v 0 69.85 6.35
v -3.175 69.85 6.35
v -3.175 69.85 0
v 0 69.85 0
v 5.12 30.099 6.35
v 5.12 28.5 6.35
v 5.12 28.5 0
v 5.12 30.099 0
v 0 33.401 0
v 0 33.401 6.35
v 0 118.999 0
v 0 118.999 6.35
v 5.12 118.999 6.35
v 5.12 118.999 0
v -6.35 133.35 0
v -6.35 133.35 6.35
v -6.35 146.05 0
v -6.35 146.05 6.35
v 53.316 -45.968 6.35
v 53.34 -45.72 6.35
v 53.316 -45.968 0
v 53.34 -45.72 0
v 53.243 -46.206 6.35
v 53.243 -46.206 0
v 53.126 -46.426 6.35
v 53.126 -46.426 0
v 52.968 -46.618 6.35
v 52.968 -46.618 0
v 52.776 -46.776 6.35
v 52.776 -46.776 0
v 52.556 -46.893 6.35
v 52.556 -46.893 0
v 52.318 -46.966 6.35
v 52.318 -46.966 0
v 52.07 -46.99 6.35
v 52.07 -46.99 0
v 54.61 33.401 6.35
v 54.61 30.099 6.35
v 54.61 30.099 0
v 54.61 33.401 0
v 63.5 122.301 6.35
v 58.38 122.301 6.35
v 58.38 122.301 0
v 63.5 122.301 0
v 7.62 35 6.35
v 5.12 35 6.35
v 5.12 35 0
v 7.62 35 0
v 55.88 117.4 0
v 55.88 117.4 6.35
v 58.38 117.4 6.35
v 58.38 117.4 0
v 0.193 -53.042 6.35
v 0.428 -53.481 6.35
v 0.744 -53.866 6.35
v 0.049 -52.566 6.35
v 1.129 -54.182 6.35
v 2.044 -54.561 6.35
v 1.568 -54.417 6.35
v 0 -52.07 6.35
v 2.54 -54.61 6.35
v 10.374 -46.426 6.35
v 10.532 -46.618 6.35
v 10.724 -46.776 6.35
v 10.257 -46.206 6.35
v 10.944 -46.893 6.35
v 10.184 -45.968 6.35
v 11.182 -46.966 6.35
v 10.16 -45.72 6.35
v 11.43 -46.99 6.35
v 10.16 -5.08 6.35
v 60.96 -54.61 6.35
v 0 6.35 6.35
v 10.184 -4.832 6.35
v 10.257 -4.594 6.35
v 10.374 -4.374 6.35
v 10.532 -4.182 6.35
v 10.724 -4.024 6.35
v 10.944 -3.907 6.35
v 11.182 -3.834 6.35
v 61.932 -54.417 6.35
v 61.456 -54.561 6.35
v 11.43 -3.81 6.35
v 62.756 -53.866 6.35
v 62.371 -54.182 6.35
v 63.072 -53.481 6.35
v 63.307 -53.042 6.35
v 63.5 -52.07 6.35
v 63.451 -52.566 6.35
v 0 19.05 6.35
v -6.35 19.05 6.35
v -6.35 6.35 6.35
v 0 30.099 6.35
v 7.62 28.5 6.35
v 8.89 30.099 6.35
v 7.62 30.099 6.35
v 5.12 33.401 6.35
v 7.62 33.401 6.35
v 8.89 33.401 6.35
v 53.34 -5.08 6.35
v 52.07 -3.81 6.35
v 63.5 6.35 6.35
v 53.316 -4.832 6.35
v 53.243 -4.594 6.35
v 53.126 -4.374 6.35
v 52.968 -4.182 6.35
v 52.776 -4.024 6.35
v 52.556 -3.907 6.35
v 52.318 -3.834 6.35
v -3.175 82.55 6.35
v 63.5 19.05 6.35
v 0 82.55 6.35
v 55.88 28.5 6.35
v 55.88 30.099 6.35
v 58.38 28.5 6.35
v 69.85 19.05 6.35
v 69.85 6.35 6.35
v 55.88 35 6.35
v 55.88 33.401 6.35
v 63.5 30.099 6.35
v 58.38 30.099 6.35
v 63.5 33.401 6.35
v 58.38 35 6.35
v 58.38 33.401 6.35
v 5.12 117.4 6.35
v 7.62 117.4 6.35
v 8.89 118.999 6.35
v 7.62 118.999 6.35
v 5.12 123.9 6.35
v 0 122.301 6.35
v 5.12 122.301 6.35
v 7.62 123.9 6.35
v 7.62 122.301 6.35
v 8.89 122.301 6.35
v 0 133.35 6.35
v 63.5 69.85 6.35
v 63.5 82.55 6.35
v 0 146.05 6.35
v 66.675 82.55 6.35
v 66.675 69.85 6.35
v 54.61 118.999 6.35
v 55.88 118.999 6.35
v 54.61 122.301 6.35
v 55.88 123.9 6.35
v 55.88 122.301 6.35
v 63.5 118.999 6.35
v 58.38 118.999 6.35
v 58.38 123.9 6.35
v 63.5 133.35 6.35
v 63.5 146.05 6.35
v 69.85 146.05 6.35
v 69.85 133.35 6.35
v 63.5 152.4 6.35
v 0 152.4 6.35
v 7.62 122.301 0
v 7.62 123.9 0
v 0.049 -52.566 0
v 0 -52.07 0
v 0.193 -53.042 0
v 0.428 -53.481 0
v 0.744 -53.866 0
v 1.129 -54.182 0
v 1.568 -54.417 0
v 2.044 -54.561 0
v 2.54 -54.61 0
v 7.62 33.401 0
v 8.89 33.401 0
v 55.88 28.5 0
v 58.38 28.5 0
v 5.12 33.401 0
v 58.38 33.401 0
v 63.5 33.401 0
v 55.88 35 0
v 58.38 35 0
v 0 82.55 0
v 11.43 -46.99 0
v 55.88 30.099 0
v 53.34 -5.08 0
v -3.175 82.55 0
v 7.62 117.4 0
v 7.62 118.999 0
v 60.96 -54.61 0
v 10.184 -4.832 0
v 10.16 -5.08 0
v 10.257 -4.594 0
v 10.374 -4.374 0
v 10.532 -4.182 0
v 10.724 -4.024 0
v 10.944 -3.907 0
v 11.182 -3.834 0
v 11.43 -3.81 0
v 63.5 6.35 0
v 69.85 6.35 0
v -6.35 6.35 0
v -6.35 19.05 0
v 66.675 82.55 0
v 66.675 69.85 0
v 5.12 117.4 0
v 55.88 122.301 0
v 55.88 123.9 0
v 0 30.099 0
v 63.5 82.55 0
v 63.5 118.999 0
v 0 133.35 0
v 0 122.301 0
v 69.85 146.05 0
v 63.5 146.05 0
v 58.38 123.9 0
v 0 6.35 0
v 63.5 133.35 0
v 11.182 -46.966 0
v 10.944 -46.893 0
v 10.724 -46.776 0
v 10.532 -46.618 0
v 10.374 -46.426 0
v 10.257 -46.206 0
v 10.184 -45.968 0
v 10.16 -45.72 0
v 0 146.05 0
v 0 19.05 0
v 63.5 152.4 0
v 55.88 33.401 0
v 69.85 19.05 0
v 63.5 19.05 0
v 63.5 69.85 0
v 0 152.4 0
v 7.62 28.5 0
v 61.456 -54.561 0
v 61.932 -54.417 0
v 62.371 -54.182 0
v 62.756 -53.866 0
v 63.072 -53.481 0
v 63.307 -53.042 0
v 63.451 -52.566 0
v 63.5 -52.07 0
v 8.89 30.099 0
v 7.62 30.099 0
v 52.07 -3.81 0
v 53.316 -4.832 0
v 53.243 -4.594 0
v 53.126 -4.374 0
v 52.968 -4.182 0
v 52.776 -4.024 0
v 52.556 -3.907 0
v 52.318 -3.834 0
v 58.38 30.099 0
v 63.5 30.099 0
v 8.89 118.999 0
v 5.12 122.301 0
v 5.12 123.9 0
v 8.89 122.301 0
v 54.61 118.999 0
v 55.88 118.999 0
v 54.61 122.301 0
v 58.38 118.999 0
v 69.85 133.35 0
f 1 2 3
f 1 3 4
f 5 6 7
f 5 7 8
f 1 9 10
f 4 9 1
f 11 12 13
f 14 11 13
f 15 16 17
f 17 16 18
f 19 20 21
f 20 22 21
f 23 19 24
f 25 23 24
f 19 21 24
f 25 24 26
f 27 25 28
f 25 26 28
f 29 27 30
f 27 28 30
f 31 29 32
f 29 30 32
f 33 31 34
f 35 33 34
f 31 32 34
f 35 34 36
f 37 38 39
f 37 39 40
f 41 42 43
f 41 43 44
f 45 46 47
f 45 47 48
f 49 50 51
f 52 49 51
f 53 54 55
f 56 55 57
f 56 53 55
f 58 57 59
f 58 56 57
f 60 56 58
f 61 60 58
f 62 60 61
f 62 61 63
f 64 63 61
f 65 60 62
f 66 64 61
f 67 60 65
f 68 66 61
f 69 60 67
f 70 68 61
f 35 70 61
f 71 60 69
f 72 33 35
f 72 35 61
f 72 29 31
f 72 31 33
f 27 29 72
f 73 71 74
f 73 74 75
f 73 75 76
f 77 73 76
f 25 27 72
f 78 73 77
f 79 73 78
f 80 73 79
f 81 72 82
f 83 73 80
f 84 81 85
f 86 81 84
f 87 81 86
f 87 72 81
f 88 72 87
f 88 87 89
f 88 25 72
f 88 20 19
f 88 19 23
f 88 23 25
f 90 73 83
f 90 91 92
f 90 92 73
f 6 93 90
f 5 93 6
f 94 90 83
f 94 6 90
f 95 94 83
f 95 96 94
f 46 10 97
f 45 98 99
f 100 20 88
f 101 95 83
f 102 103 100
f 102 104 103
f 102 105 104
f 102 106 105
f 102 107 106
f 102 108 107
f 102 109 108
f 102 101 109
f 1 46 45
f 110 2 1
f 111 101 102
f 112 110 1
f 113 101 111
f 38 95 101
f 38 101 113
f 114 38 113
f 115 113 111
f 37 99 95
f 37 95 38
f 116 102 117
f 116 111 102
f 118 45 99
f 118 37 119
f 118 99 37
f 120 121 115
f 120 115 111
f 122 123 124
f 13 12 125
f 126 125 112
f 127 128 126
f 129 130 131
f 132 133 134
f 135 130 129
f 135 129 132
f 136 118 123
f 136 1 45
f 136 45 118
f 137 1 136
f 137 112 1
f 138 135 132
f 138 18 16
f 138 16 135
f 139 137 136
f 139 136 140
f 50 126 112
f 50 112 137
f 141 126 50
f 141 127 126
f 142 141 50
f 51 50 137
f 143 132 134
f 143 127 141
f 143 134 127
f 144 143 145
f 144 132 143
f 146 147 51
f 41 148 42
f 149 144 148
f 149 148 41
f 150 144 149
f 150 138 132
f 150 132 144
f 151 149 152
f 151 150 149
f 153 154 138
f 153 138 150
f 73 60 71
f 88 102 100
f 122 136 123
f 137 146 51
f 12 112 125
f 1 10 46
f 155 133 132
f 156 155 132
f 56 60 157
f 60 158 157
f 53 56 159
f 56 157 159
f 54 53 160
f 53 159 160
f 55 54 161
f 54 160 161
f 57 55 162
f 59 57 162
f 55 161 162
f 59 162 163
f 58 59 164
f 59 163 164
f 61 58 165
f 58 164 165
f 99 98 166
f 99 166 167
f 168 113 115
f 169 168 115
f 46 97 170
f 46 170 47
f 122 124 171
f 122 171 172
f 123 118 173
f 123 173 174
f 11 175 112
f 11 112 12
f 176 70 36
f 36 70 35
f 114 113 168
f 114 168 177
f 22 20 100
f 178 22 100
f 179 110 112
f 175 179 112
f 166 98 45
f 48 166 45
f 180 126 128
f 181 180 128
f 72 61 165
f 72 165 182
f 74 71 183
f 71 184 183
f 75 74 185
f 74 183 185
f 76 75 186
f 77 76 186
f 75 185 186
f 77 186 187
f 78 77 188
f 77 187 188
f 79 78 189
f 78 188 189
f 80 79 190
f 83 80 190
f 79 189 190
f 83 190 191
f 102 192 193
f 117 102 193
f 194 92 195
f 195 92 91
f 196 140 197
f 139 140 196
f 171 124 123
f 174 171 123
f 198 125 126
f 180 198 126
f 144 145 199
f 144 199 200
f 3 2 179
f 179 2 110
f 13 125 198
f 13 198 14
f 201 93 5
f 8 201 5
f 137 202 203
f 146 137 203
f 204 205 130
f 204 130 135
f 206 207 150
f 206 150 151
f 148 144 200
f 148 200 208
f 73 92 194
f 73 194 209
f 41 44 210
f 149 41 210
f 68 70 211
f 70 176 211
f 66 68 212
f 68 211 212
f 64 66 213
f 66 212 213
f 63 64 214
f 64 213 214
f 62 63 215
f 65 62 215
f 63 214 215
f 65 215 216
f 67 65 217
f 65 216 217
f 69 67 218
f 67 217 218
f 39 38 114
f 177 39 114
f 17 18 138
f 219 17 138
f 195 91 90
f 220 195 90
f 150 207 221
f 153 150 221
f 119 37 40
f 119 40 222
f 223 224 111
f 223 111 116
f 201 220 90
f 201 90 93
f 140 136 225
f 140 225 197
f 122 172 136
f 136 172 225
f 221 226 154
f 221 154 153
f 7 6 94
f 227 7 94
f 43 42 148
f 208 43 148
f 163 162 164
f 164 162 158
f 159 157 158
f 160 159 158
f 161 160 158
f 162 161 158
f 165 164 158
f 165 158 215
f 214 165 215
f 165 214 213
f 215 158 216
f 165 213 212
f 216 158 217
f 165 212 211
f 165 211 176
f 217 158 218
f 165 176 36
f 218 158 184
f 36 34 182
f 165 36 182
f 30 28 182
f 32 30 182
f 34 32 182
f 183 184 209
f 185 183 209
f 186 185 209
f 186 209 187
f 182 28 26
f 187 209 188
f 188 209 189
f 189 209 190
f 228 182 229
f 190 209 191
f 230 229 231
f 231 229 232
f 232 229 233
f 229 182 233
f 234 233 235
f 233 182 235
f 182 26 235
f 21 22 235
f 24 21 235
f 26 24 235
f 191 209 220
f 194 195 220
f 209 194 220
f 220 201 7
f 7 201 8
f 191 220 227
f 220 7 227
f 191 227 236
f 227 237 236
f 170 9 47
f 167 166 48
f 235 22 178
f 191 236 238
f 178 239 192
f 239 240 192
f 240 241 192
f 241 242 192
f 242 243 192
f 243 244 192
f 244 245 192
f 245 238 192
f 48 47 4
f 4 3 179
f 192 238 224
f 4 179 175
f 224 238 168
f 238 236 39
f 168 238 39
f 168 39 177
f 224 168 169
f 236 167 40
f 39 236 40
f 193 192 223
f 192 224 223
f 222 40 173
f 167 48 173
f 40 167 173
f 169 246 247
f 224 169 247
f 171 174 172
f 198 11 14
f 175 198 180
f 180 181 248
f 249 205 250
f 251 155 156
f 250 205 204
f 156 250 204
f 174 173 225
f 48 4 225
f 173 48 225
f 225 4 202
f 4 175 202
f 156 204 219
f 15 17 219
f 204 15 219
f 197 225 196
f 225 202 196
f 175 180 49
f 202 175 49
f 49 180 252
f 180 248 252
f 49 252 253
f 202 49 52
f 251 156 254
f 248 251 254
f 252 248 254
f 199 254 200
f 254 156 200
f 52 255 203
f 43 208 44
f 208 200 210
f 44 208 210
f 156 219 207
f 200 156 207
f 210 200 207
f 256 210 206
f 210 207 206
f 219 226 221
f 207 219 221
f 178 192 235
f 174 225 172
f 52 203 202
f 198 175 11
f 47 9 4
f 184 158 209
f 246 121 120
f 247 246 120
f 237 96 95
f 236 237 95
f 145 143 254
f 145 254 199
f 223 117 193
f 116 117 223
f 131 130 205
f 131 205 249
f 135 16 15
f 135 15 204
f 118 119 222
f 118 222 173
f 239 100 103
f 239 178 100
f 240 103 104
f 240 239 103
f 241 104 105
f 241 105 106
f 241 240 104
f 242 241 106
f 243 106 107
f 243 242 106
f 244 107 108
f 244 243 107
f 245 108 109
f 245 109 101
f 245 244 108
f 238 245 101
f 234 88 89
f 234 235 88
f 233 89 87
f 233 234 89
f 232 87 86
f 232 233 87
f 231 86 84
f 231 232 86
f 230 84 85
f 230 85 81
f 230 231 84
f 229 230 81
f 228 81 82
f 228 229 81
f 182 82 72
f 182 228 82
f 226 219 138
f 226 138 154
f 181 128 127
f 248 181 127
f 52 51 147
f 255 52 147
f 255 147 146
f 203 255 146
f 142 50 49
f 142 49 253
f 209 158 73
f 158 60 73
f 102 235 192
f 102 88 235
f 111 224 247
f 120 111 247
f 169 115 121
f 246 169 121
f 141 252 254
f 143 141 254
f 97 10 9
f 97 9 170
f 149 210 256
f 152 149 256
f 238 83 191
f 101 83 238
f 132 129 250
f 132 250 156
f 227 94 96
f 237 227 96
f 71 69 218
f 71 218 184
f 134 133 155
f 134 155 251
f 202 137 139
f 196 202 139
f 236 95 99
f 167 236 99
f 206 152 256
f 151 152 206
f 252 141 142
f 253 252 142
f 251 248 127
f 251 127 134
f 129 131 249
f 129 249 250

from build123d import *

# Parameters (mm, degrees)
SKETCH1_W           = 63.5
SKETCH1_H           = 152.4
BOSS_EXTRUDE1_DEPTH = 6.35
SKETCH2_W           = 3.175
SKETCH2_H           = 12.7
SKETCH2_W_2         = 6.35
BOSS_EXTRUDE3_DEPTH = 6.35
SKETCH4_W           = 8.89
SKETCH4_H           = 3.302
SKETCH4_W_2         = 2.5
SKETCH4_H_2         = 6.5
CUT_EXTRUDE4_DEPTH  = 6.35
SKETCH5_W           = 63.5
SKETCH5_H           = 50.8
SKETCH5_W_2         = 43.18
SKETCH5_H_2         = 43.18
BOSS_EXTRUDE4_DEPTH = 6.35
SKETCH7_W           = 63.5
SKETCH7_H           = 3.81
BOSS_EXTRUDE5_DEPTH = 6.35
FILLET1_R           = 2.54
FILLET2_R           = 1.27


with BuildPart() as part:
    # Sketch1 → Boss-Extrude1 (new body)
    with BuildSketch(Plane.XY):
        with Locations((31.75, 76.2)):
            Rectangle(SKETCH1_W, SKETCH1_H)
    extrude(amount=BOSS_EXTRUDE1_DEPTH)

    # Sketch2 → Boss-Extrude3 (add)
    with BuildSketch(Plane.XY.offset(6.35)):
        with Locations((-1.5875, 76.2)):
            Rectangle(SKETCH2_W, SKETCH2_H)
        with Locations((66.675, 139.7)):
            Rectangle(SKETCH2_W_2, SKETCH2_H)
        with Locations((65.0875, 76.2)):
            Rectangle(SKETCH2_W, SKETCH2_H)
        with Locations((66.675, 12.7)):
            Rectangle(SKETCH2_W_2, SKETCH2_H)
        with Locations((-3.175, 12.7)):
            Rectangle(SKETCH2_W_2, SKETCH2_H)
        with Locations((-3.175, 139.7)):
            Rectangle(SKETCH2_W_2, SKETCH2_H)
    extrude(amount=-BOSS_EXTRUDE3_DEPTH)

    # Sketch4 → Cut-Extrude4 (cut)
    with BuildSketch(Plane.XY.offset(6.35)):
        with Locations((4.445, 120.65)):
            Rectangle(SKETCH4_W, SKETCH4_H)
        with Locations((6.37, 120.65)):
            Rectangle(SKETCH4_W_2, SKETCH4_H_2)
        with Locations((6.37, 31.75)):
            Rectangle(SKETCH4_W_2, SKETCH4_H_2)
        with Locations((4.445, 31.75)):
            Rectangle(SKETCH4_W, SKETCH4_H)
        with Locations((59.055, 31.75)):
            Rectangle(SKETCH4_W, SKETCH4_H)
        with Locations((57.13, 31.75)):
            Rectangle(SKETCH4_W_2, SKETCH4_H_2)
        with Locations((57.13, 120.65)):
            Rectangle(SKETCH4_W_2, SKETCH4_H_2)
        with Locations((59.055, 120.65)):
            Rectangle(SKETCH4_W, SKETCH4_H)
    extrude(amount=-CUT_EXTRUDE4_DEPTH, mode=Mode.SUBTRACT)

    # Sketch5 → Boss-Extrude4 (add)
    with BuildSketch(Plane.XY.offset(6.35)):
        with Locations((31.75, -25.4)):
            Rectangle(SKETCH5_W, SKETCH5_H)
        with Locations((31.75, -25.4)):
            Rectangle(SKETCH5_W_2, SKETCH5_H_2, mode=Mode.SUBTRACT)
    extrude(amount=-BOSS_EXTRUDE4_DEPTH)

    # Sketch7 → Boss-Extrude5 (add)
    with BuildSketch(Plane.XY.offset(6.35)):
        with Locations((31.75, -52.705)):
            Rectangle(SKETCH7_W, SKETCH7_H)
    extrude(amount=-BOSS_EXTRUDE5_DEPTH)

    # Fillet1
    fillet1_edges = [part.edges().sort_by_distance(p)[0] for p in [
        (63.5, -54.61, 3.175),
        (0, -54.61, 3.175),
    ]]
    fillet(fillet1_edges, radius=FILLET1_R)

    # Fillet2
    fillet2_edges = [part.edges().sort_by_distance(p)[0] for p in [
        (53.34, -46.99, 3.175),
        (10.16, -46.99, 3.175),
        (10.16, -3.81, 3.175),
        (53.34, -3.81, 3.175),
    ]]
    fillet(fillet2_edges, radius=FILLET2_R)


solid = part.part
